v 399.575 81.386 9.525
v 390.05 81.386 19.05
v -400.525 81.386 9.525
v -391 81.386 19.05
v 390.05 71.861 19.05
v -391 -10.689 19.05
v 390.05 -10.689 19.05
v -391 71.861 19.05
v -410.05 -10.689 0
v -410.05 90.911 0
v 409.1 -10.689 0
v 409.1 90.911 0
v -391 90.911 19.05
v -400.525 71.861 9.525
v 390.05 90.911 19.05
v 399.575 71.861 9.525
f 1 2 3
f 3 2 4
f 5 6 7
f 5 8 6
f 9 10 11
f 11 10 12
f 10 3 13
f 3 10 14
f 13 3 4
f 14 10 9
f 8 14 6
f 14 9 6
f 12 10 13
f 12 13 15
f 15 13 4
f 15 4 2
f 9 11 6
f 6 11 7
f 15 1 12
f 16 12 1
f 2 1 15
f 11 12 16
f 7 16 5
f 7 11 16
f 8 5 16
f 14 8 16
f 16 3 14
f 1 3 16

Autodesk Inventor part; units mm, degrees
ref_plane "YZ Plane" through (0, 0, 0) normal (1, 0, 0) x (0, 1, 0)
ref_plane "XZ Plane" through (0, 0, 0) normal (0, 1, 0) x (-1, 0, 0)
ref_plane "XY Plane" through (0, 0, 0) normal (0, 0, 1) x (1, 0, 0)
sketch "Sketch2" plane through (0, 0, 0) normal (0, 0, 1) x (1, 0, 0)
  line L0 (-410.0497, 90.9112) -> (409.1003, 90.9112)
  line L1 (409.1003, 90.9112) -> (409.1003, -10.6888)
  line L2 (409.1003, -10.6888) -> (-410.0497, -10.6888)
  line L3 (-410.0497, -10.6888) -> (-410.0497, 90.9112)
  point P0 (0, 0)
  dimension "d0" = 819.15
  dimension "d1" = 101.6
extrude "Board" add sketch "Sketch2" along normal blind 19.05
sketch "Sketch10" plane through (0, 0, 19.05) normal (0, 0, 1) x (1, 0, 0)
  line L0 (409.1003, -10.6888) -> (409.1003, 90.9112) projected
  line L1 (409.1003, 81.3862) -> (-410.0497, 81.3862)
  line L2 (-410.0497, 81.3862) -> (-410.0497, 71.8612)
  line L3 (-410.0497, 71.8612) -> (409.1003, 71.8612)
  line L4 (409.1003, 71.8612) -> (409.1003, 81.3862)
  line L5 (-410.0497, 90.9112) -> (-410.0497, -10.6888) projected
  line L6 (409.1003, 90.9112) -> (-410.0497, 90.9112) projected
  point P0 (0, 0)
  dimension "d22" = 9.525
  dimension "d23" = 9.525
sketch "Sketch8" plane through (-410.0497, -10.6888, 0) normal (0, -1, 0) x (1, 0, 0)
  line L0 (819.15, 19.05) -> (0, 19.05) projected
  line L1 (0, 0) -> (0, 19.05) projected
  line L2 (0, 19.05) -> (0, 0)
  line L3 (0, 0) -> (19.05, 19.05)
  line L4 (19.05, 19.05) -> (0, 19.05)
  line L5 (819.15, 0) -> (819.15, 19.05) projected
  line L6 (819.15, 19.05) -> (819.15, 0)
  line L7 (819.15, 0) -> (800.1, 19.05)
  line L8 (800.1, 19.05) -> (819.15, 19.05)
  point P0 (410.0497, 0)
  dimension "d15" = 45
  dimension "d16" = 45
extrude "45 degree mitre" cut sketch "Sketch8" against normal blind 101.6
extrude "Extrusion7" cut sketch "Sketch10" against normal blind 9.525 contours L3 L2 L1 L0
equation "\"d17\" = d1"
properties part number "Base Runner Rear"
